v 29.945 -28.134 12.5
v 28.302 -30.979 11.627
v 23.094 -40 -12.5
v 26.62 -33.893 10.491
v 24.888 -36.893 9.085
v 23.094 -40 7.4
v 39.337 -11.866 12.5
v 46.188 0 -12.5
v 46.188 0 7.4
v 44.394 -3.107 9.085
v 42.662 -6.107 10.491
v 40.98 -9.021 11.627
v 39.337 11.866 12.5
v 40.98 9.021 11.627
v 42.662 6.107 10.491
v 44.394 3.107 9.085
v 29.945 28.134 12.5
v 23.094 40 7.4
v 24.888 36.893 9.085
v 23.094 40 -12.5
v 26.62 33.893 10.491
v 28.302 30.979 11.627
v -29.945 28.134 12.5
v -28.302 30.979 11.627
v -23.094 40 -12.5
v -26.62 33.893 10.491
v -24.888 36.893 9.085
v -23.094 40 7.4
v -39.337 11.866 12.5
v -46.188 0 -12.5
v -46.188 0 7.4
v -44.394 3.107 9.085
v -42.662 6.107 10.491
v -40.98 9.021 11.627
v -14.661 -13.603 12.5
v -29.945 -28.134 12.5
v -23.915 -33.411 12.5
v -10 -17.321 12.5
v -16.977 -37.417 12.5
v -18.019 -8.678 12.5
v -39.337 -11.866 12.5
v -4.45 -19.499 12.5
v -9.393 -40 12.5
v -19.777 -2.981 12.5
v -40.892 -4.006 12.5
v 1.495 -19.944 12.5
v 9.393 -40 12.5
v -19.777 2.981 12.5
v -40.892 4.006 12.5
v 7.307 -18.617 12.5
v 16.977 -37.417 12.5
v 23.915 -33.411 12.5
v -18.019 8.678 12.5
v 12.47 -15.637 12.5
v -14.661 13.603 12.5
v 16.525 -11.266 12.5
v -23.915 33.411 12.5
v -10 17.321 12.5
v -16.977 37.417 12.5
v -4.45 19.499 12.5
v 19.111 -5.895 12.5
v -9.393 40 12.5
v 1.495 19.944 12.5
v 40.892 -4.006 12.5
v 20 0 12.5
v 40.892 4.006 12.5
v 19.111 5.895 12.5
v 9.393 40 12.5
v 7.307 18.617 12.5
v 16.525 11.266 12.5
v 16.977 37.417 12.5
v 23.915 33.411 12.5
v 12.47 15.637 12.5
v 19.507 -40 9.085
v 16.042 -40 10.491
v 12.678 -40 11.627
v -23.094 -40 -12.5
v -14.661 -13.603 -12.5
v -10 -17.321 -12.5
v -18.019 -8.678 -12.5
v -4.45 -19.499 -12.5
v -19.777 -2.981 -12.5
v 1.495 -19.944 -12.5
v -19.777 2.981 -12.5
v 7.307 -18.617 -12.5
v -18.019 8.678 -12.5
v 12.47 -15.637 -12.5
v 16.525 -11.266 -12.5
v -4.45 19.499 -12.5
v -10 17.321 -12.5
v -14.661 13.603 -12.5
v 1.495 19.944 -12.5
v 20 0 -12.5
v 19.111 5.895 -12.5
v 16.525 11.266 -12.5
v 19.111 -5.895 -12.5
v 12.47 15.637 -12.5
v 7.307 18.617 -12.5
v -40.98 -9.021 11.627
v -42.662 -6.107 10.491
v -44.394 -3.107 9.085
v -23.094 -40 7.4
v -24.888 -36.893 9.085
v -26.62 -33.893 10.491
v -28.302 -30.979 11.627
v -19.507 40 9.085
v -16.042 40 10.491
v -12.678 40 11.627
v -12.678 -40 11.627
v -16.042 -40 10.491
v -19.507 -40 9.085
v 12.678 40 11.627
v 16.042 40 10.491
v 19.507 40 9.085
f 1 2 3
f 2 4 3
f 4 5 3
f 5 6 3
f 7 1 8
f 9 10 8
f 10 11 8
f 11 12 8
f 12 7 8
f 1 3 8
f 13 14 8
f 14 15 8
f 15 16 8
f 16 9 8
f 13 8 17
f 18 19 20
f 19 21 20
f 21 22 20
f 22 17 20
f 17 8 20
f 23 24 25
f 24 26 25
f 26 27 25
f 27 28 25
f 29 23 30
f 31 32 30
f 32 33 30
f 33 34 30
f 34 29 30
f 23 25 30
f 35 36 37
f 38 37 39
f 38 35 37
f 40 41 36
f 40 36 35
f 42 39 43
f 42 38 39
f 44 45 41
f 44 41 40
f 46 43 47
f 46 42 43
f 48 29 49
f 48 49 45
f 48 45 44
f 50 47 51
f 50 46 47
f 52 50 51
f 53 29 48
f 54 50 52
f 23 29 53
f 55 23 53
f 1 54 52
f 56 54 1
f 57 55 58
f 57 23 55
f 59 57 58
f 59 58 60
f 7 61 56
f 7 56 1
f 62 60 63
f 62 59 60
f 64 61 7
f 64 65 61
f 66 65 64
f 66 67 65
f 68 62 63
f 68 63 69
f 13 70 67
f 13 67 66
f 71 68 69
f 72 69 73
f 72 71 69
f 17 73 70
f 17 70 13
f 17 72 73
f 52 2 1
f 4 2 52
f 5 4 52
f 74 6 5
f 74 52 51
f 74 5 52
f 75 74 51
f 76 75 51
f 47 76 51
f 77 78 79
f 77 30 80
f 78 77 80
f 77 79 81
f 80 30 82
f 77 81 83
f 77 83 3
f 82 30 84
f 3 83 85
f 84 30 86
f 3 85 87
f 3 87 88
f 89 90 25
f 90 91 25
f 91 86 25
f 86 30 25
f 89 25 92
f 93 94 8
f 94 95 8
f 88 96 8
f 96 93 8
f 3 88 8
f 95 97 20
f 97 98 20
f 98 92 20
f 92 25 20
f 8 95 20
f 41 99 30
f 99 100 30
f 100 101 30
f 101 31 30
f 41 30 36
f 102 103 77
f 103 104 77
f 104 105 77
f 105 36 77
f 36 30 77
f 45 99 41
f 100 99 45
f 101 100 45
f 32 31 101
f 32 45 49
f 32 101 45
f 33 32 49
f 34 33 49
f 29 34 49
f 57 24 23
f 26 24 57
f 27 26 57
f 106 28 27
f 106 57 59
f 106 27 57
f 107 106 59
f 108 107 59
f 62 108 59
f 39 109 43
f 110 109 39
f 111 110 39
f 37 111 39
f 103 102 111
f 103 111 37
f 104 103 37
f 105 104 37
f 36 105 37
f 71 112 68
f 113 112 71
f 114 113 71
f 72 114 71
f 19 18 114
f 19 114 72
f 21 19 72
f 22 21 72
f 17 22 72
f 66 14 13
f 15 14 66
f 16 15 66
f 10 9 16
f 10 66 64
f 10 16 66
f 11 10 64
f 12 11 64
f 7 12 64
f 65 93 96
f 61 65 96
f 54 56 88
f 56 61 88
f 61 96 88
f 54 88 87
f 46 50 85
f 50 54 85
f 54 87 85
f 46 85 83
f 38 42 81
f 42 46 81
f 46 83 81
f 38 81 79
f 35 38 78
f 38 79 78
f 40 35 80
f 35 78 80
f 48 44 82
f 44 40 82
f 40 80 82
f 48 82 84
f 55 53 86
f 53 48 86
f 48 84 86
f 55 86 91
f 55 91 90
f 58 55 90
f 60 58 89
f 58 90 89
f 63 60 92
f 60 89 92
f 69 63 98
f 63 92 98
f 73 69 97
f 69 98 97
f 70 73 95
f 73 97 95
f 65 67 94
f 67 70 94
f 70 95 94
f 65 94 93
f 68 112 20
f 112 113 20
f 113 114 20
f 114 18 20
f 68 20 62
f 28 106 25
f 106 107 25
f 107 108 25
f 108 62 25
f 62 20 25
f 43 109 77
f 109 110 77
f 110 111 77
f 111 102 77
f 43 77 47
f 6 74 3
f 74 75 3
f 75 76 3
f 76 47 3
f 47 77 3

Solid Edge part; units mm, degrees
sketch "Sketch1" plane through (0, 0, 0) normal (0, 0, 1) x (1, 0, 0)
  line L0 (23.094, -40) -> (46.188, 0)
  line L1 (46.188, 0) -> (23.094, 40)
  line L2 (23.094, 40) -> (-23.094, 40)
  line L3 (-23.094, 40) -> (-46.188, 0)
  line L4 (-46.188, 0) -> (-23.094, -40)
  line L5 (-23.094, -40) -> (23.094, -40)
  circle A0 centre (0, 0) radius 20
extrude "Protrusion1" add sketch "Sketch1" along normal mid plane 25
sketch "Sketch2" plane through (0, 0, 0) normal (0, -1, 0) x (1, 0, 0)
  line L0 (41.088, 12.5) -> (46.188, 7.4)
  line L1 (46.188, 12.5) -> (46.188, 7.4)
  line L2 (46.188, 12.5) -> (41.088, 12.5)
revolve "RevolvedCutout1" cut sketch "Sketch2" angle 360 about axis through (0, 0, -26.9606) along (0, 0, 1)
